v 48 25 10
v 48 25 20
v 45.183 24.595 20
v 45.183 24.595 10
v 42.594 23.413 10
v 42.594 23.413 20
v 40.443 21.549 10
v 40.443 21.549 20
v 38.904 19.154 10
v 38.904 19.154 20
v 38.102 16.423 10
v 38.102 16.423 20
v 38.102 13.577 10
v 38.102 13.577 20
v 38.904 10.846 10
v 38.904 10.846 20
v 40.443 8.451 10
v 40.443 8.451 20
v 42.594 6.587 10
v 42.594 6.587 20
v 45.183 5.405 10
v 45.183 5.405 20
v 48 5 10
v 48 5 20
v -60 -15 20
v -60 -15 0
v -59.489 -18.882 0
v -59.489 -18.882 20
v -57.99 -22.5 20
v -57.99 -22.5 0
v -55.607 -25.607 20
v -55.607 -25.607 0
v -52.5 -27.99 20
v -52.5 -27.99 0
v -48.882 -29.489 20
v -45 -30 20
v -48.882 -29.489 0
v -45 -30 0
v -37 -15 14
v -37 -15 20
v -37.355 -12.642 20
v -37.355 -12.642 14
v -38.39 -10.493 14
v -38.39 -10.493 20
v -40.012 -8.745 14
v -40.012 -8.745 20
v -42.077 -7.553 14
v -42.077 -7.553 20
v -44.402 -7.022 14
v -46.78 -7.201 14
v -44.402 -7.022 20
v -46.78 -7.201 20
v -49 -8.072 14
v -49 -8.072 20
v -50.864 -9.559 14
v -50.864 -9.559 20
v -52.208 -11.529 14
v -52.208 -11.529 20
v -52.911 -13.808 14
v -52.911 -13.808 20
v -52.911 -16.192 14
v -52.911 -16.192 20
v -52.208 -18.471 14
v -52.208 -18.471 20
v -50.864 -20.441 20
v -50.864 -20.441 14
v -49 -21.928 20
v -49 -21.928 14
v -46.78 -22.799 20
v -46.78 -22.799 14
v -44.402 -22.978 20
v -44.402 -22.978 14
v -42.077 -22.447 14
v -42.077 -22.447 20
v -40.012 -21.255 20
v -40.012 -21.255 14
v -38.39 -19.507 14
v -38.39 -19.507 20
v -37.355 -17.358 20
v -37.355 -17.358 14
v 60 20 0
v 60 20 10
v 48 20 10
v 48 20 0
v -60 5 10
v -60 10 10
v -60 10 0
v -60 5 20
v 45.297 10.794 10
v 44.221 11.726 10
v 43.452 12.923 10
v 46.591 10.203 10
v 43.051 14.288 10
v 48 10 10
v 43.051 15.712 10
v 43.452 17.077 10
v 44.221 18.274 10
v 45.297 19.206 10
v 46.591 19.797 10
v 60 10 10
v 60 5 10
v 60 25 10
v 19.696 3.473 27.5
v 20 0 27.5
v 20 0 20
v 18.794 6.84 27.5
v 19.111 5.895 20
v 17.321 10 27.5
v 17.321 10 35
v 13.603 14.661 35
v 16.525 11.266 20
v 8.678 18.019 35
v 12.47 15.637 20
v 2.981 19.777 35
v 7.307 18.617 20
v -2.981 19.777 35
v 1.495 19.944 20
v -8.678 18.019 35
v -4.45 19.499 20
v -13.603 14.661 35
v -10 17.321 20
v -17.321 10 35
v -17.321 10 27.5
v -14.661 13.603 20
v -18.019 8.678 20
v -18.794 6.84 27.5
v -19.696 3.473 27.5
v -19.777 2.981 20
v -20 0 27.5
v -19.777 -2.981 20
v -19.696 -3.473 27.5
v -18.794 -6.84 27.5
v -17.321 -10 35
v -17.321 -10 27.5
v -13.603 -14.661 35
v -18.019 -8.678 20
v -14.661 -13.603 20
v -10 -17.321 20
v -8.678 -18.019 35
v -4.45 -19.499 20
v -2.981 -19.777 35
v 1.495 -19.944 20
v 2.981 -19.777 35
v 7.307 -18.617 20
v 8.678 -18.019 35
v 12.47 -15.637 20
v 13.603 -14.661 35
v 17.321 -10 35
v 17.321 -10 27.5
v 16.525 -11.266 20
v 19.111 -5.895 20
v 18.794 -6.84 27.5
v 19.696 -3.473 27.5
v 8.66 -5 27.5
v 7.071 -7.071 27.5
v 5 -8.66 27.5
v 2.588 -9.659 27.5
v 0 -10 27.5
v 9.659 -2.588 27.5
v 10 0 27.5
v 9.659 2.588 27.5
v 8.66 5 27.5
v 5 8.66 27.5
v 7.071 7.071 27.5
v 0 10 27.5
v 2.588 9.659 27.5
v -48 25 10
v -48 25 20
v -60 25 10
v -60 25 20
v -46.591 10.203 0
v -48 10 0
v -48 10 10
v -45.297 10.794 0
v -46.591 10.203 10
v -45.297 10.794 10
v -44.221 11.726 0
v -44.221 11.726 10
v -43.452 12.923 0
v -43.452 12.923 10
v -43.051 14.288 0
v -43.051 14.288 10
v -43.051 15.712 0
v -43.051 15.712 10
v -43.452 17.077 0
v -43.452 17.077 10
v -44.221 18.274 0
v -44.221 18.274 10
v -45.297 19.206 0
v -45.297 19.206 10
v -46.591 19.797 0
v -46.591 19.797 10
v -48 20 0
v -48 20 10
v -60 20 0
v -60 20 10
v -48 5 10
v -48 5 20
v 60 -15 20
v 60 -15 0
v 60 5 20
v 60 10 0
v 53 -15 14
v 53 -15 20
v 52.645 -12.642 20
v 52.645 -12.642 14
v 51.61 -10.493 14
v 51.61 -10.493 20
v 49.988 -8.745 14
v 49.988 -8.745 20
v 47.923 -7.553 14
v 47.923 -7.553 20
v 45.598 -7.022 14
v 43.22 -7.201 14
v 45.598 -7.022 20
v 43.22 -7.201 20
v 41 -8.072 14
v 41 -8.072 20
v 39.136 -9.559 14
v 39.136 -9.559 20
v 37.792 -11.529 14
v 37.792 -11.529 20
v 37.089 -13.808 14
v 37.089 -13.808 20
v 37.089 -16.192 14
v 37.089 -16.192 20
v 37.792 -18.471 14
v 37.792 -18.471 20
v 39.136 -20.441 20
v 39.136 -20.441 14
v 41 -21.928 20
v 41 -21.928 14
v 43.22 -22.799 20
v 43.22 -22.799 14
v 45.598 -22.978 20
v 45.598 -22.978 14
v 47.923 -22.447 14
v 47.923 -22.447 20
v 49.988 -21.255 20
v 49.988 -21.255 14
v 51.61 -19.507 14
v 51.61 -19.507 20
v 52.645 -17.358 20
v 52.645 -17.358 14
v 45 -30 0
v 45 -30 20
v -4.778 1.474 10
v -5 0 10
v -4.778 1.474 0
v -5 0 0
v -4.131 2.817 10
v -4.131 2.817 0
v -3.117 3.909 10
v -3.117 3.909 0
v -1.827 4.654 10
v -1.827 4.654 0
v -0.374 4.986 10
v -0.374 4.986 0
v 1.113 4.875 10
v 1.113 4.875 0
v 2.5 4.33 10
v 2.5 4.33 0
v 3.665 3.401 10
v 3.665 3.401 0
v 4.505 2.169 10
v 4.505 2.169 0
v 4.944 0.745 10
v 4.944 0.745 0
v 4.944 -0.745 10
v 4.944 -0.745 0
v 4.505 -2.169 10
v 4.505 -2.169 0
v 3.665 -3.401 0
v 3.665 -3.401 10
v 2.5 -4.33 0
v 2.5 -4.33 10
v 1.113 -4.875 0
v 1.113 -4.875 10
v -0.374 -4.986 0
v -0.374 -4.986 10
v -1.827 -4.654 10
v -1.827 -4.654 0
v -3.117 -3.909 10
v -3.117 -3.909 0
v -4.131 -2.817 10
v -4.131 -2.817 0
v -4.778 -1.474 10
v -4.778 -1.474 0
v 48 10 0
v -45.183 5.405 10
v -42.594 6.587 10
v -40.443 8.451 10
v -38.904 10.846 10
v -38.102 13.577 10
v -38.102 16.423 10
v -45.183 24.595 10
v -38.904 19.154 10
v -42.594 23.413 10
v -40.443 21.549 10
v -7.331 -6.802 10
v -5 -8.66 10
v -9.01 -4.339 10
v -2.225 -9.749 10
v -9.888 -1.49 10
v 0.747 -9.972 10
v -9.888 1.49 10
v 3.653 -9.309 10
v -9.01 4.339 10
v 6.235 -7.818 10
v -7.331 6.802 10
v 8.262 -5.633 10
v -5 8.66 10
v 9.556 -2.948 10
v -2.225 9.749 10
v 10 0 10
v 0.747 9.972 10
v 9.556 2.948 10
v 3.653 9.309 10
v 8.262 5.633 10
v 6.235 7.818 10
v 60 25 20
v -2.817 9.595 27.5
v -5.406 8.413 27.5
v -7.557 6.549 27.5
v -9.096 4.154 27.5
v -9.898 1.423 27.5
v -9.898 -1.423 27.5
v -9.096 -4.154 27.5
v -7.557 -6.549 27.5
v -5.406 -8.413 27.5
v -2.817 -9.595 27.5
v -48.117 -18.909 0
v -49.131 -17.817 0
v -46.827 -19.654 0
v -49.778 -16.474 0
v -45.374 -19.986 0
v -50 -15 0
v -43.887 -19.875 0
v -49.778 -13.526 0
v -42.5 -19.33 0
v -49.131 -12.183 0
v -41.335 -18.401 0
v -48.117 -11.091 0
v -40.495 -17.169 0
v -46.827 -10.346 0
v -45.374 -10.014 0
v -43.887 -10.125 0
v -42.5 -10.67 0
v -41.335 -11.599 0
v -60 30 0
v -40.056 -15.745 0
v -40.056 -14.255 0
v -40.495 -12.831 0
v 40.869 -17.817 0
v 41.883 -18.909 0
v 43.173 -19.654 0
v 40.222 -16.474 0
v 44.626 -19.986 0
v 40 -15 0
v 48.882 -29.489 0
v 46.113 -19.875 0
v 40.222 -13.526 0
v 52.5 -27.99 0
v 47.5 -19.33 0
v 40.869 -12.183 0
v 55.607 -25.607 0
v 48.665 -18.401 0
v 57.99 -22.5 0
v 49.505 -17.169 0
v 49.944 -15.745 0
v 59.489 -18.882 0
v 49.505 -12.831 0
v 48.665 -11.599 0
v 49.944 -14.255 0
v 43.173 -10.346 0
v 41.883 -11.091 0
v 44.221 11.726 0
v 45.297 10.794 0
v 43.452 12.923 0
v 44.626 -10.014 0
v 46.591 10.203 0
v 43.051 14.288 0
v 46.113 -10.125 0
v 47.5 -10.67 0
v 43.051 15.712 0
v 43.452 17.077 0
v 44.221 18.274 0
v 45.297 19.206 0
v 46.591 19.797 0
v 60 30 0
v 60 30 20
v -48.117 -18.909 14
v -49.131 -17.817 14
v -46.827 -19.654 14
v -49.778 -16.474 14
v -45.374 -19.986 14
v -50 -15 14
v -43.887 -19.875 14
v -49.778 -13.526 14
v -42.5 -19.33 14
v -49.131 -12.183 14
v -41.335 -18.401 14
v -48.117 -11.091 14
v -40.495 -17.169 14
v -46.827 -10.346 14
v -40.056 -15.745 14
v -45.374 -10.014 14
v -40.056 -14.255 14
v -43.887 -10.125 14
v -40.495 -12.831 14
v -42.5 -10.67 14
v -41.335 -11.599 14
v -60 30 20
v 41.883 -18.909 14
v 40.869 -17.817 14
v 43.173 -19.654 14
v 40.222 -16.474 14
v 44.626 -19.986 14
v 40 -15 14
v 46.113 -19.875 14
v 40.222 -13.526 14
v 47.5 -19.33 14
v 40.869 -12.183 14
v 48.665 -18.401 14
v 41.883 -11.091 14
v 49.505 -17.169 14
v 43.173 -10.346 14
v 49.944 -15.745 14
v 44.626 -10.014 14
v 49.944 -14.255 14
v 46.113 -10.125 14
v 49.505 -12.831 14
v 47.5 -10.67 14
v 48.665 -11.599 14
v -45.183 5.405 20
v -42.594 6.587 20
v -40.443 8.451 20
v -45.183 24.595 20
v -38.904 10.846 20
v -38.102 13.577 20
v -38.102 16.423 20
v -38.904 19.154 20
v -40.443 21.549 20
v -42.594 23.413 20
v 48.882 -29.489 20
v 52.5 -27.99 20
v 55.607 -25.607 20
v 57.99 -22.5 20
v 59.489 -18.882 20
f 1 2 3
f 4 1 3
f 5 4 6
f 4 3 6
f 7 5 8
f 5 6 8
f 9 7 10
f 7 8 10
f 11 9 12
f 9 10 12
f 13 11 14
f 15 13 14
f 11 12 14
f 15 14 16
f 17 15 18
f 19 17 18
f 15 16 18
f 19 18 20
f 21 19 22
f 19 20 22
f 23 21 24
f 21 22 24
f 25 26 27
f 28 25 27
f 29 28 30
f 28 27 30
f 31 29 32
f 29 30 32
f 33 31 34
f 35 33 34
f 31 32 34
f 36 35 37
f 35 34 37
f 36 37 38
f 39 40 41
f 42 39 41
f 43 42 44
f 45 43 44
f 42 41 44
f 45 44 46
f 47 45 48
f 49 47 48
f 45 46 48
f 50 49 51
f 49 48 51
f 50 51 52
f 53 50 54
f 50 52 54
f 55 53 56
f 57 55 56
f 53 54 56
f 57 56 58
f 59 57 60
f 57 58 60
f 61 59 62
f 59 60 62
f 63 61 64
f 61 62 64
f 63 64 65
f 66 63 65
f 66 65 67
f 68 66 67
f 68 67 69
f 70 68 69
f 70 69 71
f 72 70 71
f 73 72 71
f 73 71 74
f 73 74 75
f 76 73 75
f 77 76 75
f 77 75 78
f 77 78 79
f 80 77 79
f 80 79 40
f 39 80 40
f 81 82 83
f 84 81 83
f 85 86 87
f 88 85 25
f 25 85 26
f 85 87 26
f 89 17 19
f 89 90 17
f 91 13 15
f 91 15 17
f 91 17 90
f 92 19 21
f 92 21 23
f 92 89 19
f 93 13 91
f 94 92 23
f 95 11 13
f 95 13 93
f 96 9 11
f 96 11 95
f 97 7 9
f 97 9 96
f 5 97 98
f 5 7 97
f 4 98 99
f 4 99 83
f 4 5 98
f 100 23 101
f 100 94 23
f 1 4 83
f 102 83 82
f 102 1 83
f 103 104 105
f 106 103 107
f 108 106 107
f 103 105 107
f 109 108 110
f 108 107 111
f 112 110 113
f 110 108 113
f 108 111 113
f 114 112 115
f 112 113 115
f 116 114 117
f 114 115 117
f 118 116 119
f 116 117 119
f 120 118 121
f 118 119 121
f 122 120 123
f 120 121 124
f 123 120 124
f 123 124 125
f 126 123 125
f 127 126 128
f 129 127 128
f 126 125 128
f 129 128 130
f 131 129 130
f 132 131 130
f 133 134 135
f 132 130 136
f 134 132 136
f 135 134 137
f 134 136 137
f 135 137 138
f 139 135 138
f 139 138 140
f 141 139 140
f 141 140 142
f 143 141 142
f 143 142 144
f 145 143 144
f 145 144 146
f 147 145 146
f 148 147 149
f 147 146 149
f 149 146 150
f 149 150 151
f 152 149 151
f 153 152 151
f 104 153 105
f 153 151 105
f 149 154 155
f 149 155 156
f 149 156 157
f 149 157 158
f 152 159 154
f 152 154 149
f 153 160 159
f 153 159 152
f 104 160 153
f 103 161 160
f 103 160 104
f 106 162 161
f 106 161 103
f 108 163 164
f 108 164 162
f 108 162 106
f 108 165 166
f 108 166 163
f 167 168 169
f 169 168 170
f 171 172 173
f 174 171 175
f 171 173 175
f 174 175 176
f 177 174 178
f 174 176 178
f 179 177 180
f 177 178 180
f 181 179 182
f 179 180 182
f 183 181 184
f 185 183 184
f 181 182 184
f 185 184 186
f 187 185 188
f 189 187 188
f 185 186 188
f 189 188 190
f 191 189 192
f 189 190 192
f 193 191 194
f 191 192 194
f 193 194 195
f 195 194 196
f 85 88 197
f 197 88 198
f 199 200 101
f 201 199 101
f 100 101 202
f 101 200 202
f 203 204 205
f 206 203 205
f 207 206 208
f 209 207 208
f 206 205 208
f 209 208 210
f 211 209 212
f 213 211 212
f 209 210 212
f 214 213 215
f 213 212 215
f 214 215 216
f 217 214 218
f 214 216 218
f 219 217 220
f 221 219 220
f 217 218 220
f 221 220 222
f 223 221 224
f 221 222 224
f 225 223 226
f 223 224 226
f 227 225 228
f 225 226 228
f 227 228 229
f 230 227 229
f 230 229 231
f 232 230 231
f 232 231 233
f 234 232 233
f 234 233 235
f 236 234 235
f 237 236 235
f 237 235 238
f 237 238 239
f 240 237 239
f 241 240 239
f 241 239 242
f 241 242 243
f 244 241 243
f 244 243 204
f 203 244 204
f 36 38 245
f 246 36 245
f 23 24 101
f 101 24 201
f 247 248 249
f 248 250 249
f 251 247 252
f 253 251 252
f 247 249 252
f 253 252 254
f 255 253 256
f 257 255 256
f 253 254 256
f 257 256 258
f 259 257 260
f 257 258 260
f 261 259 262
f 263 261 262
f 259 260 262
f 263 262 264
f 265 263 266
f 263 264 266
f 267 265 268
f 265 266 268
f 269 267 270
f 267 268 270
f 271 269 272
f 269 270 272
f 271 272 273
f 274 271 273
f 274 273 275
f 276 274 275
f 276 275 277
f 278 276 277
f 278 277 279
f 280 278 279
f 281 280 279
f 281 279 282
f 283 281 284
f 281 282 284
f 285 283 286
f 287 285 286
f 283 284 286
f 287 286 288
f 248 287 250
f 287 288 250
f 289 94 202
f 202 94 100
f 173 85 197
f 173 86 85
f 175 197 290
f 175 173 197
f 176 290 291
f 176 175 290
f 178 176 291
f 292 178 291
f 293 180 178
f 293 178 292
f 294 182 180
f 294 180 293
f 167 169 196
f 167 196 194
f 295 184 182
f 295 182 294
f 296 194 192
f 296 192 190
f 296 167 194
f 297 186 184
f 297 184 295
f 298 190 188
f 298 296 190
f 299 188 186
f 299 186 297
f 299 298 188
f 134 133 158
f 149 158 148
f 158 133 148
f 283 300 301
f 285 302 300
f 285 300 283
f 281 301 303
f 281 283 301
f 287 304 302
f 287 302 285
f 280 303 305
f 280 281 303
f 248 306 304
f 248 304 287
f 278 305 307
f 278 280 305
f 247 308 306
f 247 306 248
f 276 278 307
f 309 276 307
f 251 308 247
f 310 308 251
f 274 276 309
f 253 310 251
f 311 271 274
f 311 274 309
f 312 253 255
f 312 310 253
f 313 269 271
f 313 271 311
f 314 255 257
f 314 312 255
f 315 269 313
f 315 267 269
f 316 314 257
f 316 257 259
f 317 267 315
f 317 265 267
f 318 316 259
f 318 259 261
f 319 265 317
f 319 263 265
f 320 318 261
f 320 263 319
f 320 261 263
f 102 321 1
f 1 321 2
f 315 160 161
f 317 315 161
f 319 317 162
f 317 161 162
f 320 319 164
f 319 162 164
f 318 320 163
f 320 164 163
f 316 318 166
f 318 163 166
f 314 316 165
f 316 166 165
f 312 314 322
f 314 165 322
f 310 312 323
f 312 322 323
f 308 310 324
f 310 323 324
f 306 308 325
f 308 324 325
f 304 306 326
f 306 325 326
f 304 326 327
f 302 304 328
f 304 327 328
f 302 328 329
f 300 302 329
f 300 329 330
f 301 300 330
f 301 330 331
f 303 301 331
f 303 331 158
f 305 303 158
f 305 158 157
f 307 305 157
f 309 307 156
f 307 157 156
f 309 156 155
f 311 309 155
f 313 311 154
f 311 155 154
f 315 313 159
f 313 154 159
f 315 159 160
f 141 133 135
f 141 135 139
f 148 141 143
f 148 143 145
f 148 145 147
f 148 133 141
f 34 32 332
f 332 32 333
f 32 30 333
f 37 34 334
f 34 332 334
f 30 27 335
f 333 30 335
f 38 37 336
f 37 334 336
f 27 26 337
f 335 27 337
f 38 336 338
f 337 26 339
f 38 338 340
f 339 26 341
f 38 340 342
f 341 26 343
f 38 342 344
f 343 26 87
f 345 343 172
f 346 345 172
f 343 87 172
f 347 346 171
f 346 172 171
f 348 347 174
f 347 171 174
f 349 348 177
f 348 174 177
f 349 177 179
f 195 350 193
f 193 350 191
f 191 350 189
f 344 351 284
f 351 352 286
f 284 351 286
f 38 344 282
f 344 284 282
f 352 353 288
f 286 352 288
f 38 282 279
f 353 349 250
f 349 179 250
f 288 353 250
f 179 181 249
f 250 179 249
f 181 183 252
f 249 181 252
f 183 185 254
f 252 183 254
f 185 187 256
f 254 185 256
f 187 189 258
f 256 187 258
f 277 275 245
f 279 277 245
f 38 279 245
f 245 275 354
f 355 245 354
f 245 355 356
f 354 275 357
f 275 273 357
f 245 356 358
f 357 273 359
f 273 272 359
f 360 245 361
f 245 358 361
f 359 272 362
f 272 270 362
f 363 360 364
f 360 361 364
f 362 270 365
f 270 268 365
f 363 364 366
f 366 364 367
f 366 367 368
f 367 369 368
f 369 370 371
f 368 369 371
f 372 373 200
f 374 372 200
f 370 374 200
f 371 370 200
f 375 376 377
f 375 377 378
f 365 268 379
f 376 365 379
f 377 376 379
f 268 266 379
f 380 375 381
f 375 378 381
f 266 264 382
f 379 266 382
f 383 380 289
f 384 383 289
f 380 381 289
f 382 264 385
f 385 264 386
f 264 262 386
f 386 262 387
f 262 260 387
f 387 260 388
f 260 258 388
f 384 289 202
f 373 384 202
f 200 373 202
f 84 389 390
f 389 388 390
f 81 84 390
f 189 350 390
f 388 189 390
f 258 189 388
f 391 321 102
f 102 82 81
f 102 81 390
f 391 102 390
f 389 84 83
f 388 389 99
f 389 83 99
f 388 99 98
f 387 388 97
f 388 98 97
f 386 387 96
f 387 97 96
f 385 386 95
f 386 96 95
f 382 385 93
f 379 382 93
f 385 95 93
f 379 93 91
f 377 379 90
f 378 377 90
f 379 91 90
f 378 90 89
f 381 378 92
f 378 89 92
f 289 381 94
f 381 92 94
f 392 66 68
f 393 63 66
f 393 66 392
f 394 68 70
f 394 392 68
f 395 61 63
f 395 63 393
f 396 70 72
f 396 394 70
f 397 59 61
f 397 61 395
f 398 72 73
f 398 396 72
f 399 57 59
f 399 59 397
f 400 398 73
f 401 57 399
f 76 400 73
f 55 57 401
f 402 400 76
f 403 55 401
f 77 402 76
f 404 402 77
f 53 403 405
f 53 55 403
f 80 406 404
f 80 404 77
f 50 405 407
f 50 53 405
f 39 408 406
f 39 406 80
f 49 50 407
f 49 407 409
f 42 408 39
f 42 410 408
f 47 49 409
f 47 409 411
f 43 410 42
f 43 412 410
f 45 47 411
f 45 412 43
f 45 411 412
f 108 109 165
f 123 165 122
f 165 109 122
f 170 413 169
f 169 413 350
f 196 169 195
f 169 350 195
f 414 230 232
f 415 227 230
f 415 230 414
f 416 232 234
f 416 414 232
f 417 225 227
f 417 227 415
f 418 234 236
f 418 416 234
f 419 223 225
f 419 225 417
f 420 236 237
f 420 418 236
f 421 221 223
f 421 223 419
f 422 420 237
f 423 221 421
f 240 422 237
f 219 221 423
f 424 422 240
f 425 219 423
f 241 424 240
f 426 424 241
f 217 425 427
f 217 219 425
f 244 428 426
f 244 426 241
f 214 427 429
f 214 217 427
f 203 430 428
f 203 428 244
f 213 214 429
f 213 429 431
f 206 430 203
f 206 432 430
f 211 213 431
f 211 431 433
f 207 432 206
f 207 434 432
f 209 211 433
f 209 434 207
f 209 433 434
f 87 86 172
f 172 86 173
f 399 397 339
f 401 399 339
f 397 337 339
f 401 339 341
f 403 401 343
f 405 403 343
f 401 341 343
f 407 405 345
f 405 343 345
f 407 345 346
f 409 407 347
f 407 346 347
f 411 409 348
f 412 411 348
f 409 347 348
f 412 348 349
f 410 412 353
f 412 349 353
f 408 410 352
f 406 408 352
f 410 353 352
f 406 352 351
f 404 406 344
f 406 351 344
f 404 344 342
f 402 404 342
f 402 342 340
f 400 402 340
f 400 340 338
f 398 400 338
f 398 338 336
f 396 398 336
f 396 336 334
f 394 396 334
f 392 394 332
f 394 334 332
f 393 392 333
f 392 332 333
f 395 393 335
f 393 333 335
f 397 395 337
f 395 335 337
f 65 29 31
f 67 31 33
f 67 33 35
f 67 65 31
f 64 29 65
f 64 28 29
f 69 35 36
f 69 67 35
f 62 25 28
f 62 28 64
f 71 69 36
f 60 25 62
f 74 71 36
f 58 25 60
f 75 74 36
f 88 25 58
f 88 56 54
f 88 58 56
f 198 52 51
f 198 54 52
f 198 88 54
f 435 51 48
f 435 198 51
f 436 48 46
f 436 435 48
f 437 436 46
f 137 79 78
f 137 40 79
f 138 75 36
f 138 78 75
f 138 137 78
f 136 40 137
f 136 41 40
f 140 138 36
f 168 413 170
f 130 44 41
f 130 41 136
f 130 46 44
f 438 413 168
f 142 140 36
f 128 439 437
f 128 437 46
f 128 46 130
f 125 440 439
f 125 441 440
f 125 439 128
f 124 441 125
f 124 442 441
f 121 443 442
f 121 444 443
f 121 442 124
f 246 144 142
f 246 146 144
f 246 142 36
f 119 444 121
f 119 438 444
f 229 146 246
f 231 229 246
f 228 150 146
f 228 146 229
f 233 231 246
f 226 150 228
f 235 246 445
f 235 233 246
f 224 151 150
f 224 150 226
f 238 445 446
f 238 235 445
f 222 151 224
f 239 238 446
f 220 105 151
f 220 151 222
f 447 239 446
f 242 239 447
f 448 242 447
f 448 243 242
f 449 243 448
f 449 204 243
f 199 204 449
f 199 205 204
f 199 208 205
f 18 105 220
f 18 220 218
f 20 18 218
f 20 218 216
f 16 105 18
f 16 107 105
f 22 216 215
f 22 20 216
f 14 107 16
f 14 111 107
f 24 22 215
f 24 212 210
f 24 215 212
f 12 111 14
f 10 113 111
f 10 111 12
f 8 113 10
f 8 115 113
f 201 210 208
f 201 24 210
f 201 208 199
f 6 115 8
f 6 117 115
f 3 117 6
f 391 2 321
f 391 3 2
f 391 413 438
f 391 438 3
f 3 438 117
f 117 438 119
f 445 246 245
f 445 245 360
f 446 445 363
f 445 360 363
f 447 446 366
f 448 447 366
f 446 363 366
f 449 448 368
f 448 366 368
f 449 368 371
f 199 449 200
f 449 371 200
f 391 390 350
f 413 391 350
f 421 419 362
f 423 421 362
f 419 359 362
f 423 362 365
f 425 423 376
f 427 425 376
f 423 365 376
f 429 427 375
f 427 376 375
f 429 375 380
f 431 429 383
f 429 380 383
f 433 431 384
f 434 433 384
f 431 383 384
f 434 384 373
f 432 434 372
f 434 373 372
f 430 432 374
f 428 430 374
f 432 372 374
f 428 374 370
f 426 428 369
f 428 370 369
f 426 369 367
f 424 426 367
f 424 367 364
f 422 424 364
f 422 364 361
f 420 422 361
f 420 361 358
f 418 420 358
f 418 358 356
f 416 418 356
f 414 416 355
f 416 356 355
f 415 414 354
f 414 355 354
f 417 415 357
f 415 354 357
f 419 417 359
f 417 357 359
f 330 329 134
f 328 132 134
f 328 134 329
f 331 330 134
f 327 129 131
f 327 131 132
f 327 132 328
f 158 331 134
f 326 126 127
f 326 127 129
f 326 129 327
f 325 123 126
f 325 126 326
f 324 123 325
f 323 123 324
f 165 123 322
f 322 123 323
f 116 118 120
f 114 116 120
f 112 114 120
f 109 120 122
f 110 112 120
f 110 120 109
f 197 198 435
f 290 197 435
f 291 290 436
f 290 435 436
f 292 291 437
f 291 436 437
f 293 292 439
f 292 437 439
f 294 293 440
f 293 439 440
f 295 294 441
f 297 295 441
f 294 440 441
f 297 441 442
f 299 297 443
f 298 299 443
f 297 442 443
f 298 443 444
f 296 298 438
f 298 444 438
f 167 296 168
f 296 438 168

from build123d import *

# Parameters (mm, degrees)
F1_DEPTH        = 20
F2_R            = 20
F3_DEPTH        = 15
F6_DEPTH        = 20.001
F7_DEPTH        = 10
F8_D            = 10
F8_CBORE_D      = 16
F8_CBORE_DEPTH  = 6
F10_D           = 10
F10_CBORE_D     = 20
F10_CBORE_DEPTH = 25
F12_DEPTH       = 7.5


# Not quite as in the source:
# - a feature names something its author has since deleted; it is built from what else it names


with BuildPart() as f1:
    # F0 (on Top) → F1 (new body)
    with BuildSketch(Plane.XY):
        with BuildLine():
            Line((60, 30), (-60, 30))
            Line((-60, 30), (-60, -15))
            ThreePointArc((-60, -15), (-55.6066017178, -25.6066017178), (-45, -30))
            Line((-45, -30), (45, -30))
            ThreePointArc((45, -30), (55.6066017178, -25.6066017178), (60, -15))
            Line((60, -15), (60, 30))
        make_face()
    extrude(amount=F1_DEPTH)

    # F2 (on face) → F3 (join)
    with BuildSketch(Plane.XY.offset(20)):
        Circle(F2_R)
    extrude(amount=F3_DEPTH)

    # F5 (on face) → F6 (cut, through all)
    with BuildSketch(Plane.XY.offset(20)):
        with BuildLine():
            Line((-60, 20), (-60, 10))
            Line((-60, 10), (-48, 10))
            ThreePointArc((-48, 10), (-43, 15), (-48, 20))
            Line((-48, 20), (-60, 20))
        make_face()
        with BuildLine():
            Line((60, 10), (60, 20))
            Line((60, 20), (48, 20))
            ThreePointArc((48, 20), (43, 15), (48, 10))
            Line((48, 10), (60, 10))
        make_face()
    extrude(amount=-F6_DEPTH, mode=Mode.SUBTRACT)

    # F5 (on face) → F7 (cut)
    with BuildSketch(Plane.XY.offset(20)):
        with BuildLine():
            Line((-60, 5), (-48, 5))
            ThreePointArc((-48, 5), (-38, 15), (-48, 25))
            Line((-48, 25), (-60, 25))
            Line((-60, 25), (-60, 20))
            Line((-60, 20), (-48, 20))
            ThreePointArc((-48, 20), (-43, 15), (-48, 10))
            Line((-48, 10), (-60, 10))
            Line((-60, 10), (-60, 5))
        make_face()
        with BuildLine():
            Line((60, 20), (60, 25))
            Line((60, 25), (48, 25))
            ThreePointArc((48, 25), (38, 15), (48, 5))
            Line((48, 5), (60, 5))
            Line((60, 5), (60, 10))
            Line((60, 10), (48, 10))
            ThreePointArc((48, 10), (43, 15), (48, 20))
            Line((48, 20), (60, 20))
        make_face()
    extrude(amount=-F7_DEPTH, mode=Mode.SUBTRACT)

    # F8 (through all)
    with Locations(Plane.XY.offset(20)):
        with Locations((-45, -15), (45, -15)):
            CounterBoreHole(F8_D / 2, F8_CBORE_D / 2, F8_CBORE_DEPTH)

    # F10 (through all)
    with Locations(Plane.XY.offset(35)):
        with Locations((0, 0)):
            CounterBoreHole(F10_D / 2, F10_CBORE_D / 2, F10_CBORE_DEPTH)

    # F11 (on face) → F12 (cut)
    with BuildSketch(Plane.XY.offset(35)):
        with BuildLine():
            Line((-3.73e-08, 10), (-17.3205080757, 10))
            ThreePointArc((-17.3205080757, 10), (-19.3185165265, 5.1763808994), (-20, -5.5e-09))
            ThreePointArc((-20, -5.5e-09), (-19.3185165251, -5.1763809047), (-17.3205080757, -10))
            Line((-17.3205080757, -10), (0, -10))
            ThreePointArc((0, -10), (-10, -1.87e-08), (-3.73e-08, 10))
        make_face()
        with BuildLine():
            Line((17.3205080757, 10), (-3.73e-08, 10))
            ThreePointArc((-3.73e-08, 10), (7.0710677987, 7.0710678251), (10, 0))
            ThreePointArc((10, 0), (7.0710678119, -7.0710678119), (0, -10))
            Line((0, -10), (17.3205080757, -10))
            ThreePointArc((17.3205080757, -10), (19.3185165258, -5.1763809021), (20, 0))
            ThreePointArc((20, 0), (19.3185165258, 5.1763809021), (17.3205080757, 10))
        make_face()
    extrude(amount=-F12_DEPTH, mode=Mode.SUBTRACT)


solid = f1.part
